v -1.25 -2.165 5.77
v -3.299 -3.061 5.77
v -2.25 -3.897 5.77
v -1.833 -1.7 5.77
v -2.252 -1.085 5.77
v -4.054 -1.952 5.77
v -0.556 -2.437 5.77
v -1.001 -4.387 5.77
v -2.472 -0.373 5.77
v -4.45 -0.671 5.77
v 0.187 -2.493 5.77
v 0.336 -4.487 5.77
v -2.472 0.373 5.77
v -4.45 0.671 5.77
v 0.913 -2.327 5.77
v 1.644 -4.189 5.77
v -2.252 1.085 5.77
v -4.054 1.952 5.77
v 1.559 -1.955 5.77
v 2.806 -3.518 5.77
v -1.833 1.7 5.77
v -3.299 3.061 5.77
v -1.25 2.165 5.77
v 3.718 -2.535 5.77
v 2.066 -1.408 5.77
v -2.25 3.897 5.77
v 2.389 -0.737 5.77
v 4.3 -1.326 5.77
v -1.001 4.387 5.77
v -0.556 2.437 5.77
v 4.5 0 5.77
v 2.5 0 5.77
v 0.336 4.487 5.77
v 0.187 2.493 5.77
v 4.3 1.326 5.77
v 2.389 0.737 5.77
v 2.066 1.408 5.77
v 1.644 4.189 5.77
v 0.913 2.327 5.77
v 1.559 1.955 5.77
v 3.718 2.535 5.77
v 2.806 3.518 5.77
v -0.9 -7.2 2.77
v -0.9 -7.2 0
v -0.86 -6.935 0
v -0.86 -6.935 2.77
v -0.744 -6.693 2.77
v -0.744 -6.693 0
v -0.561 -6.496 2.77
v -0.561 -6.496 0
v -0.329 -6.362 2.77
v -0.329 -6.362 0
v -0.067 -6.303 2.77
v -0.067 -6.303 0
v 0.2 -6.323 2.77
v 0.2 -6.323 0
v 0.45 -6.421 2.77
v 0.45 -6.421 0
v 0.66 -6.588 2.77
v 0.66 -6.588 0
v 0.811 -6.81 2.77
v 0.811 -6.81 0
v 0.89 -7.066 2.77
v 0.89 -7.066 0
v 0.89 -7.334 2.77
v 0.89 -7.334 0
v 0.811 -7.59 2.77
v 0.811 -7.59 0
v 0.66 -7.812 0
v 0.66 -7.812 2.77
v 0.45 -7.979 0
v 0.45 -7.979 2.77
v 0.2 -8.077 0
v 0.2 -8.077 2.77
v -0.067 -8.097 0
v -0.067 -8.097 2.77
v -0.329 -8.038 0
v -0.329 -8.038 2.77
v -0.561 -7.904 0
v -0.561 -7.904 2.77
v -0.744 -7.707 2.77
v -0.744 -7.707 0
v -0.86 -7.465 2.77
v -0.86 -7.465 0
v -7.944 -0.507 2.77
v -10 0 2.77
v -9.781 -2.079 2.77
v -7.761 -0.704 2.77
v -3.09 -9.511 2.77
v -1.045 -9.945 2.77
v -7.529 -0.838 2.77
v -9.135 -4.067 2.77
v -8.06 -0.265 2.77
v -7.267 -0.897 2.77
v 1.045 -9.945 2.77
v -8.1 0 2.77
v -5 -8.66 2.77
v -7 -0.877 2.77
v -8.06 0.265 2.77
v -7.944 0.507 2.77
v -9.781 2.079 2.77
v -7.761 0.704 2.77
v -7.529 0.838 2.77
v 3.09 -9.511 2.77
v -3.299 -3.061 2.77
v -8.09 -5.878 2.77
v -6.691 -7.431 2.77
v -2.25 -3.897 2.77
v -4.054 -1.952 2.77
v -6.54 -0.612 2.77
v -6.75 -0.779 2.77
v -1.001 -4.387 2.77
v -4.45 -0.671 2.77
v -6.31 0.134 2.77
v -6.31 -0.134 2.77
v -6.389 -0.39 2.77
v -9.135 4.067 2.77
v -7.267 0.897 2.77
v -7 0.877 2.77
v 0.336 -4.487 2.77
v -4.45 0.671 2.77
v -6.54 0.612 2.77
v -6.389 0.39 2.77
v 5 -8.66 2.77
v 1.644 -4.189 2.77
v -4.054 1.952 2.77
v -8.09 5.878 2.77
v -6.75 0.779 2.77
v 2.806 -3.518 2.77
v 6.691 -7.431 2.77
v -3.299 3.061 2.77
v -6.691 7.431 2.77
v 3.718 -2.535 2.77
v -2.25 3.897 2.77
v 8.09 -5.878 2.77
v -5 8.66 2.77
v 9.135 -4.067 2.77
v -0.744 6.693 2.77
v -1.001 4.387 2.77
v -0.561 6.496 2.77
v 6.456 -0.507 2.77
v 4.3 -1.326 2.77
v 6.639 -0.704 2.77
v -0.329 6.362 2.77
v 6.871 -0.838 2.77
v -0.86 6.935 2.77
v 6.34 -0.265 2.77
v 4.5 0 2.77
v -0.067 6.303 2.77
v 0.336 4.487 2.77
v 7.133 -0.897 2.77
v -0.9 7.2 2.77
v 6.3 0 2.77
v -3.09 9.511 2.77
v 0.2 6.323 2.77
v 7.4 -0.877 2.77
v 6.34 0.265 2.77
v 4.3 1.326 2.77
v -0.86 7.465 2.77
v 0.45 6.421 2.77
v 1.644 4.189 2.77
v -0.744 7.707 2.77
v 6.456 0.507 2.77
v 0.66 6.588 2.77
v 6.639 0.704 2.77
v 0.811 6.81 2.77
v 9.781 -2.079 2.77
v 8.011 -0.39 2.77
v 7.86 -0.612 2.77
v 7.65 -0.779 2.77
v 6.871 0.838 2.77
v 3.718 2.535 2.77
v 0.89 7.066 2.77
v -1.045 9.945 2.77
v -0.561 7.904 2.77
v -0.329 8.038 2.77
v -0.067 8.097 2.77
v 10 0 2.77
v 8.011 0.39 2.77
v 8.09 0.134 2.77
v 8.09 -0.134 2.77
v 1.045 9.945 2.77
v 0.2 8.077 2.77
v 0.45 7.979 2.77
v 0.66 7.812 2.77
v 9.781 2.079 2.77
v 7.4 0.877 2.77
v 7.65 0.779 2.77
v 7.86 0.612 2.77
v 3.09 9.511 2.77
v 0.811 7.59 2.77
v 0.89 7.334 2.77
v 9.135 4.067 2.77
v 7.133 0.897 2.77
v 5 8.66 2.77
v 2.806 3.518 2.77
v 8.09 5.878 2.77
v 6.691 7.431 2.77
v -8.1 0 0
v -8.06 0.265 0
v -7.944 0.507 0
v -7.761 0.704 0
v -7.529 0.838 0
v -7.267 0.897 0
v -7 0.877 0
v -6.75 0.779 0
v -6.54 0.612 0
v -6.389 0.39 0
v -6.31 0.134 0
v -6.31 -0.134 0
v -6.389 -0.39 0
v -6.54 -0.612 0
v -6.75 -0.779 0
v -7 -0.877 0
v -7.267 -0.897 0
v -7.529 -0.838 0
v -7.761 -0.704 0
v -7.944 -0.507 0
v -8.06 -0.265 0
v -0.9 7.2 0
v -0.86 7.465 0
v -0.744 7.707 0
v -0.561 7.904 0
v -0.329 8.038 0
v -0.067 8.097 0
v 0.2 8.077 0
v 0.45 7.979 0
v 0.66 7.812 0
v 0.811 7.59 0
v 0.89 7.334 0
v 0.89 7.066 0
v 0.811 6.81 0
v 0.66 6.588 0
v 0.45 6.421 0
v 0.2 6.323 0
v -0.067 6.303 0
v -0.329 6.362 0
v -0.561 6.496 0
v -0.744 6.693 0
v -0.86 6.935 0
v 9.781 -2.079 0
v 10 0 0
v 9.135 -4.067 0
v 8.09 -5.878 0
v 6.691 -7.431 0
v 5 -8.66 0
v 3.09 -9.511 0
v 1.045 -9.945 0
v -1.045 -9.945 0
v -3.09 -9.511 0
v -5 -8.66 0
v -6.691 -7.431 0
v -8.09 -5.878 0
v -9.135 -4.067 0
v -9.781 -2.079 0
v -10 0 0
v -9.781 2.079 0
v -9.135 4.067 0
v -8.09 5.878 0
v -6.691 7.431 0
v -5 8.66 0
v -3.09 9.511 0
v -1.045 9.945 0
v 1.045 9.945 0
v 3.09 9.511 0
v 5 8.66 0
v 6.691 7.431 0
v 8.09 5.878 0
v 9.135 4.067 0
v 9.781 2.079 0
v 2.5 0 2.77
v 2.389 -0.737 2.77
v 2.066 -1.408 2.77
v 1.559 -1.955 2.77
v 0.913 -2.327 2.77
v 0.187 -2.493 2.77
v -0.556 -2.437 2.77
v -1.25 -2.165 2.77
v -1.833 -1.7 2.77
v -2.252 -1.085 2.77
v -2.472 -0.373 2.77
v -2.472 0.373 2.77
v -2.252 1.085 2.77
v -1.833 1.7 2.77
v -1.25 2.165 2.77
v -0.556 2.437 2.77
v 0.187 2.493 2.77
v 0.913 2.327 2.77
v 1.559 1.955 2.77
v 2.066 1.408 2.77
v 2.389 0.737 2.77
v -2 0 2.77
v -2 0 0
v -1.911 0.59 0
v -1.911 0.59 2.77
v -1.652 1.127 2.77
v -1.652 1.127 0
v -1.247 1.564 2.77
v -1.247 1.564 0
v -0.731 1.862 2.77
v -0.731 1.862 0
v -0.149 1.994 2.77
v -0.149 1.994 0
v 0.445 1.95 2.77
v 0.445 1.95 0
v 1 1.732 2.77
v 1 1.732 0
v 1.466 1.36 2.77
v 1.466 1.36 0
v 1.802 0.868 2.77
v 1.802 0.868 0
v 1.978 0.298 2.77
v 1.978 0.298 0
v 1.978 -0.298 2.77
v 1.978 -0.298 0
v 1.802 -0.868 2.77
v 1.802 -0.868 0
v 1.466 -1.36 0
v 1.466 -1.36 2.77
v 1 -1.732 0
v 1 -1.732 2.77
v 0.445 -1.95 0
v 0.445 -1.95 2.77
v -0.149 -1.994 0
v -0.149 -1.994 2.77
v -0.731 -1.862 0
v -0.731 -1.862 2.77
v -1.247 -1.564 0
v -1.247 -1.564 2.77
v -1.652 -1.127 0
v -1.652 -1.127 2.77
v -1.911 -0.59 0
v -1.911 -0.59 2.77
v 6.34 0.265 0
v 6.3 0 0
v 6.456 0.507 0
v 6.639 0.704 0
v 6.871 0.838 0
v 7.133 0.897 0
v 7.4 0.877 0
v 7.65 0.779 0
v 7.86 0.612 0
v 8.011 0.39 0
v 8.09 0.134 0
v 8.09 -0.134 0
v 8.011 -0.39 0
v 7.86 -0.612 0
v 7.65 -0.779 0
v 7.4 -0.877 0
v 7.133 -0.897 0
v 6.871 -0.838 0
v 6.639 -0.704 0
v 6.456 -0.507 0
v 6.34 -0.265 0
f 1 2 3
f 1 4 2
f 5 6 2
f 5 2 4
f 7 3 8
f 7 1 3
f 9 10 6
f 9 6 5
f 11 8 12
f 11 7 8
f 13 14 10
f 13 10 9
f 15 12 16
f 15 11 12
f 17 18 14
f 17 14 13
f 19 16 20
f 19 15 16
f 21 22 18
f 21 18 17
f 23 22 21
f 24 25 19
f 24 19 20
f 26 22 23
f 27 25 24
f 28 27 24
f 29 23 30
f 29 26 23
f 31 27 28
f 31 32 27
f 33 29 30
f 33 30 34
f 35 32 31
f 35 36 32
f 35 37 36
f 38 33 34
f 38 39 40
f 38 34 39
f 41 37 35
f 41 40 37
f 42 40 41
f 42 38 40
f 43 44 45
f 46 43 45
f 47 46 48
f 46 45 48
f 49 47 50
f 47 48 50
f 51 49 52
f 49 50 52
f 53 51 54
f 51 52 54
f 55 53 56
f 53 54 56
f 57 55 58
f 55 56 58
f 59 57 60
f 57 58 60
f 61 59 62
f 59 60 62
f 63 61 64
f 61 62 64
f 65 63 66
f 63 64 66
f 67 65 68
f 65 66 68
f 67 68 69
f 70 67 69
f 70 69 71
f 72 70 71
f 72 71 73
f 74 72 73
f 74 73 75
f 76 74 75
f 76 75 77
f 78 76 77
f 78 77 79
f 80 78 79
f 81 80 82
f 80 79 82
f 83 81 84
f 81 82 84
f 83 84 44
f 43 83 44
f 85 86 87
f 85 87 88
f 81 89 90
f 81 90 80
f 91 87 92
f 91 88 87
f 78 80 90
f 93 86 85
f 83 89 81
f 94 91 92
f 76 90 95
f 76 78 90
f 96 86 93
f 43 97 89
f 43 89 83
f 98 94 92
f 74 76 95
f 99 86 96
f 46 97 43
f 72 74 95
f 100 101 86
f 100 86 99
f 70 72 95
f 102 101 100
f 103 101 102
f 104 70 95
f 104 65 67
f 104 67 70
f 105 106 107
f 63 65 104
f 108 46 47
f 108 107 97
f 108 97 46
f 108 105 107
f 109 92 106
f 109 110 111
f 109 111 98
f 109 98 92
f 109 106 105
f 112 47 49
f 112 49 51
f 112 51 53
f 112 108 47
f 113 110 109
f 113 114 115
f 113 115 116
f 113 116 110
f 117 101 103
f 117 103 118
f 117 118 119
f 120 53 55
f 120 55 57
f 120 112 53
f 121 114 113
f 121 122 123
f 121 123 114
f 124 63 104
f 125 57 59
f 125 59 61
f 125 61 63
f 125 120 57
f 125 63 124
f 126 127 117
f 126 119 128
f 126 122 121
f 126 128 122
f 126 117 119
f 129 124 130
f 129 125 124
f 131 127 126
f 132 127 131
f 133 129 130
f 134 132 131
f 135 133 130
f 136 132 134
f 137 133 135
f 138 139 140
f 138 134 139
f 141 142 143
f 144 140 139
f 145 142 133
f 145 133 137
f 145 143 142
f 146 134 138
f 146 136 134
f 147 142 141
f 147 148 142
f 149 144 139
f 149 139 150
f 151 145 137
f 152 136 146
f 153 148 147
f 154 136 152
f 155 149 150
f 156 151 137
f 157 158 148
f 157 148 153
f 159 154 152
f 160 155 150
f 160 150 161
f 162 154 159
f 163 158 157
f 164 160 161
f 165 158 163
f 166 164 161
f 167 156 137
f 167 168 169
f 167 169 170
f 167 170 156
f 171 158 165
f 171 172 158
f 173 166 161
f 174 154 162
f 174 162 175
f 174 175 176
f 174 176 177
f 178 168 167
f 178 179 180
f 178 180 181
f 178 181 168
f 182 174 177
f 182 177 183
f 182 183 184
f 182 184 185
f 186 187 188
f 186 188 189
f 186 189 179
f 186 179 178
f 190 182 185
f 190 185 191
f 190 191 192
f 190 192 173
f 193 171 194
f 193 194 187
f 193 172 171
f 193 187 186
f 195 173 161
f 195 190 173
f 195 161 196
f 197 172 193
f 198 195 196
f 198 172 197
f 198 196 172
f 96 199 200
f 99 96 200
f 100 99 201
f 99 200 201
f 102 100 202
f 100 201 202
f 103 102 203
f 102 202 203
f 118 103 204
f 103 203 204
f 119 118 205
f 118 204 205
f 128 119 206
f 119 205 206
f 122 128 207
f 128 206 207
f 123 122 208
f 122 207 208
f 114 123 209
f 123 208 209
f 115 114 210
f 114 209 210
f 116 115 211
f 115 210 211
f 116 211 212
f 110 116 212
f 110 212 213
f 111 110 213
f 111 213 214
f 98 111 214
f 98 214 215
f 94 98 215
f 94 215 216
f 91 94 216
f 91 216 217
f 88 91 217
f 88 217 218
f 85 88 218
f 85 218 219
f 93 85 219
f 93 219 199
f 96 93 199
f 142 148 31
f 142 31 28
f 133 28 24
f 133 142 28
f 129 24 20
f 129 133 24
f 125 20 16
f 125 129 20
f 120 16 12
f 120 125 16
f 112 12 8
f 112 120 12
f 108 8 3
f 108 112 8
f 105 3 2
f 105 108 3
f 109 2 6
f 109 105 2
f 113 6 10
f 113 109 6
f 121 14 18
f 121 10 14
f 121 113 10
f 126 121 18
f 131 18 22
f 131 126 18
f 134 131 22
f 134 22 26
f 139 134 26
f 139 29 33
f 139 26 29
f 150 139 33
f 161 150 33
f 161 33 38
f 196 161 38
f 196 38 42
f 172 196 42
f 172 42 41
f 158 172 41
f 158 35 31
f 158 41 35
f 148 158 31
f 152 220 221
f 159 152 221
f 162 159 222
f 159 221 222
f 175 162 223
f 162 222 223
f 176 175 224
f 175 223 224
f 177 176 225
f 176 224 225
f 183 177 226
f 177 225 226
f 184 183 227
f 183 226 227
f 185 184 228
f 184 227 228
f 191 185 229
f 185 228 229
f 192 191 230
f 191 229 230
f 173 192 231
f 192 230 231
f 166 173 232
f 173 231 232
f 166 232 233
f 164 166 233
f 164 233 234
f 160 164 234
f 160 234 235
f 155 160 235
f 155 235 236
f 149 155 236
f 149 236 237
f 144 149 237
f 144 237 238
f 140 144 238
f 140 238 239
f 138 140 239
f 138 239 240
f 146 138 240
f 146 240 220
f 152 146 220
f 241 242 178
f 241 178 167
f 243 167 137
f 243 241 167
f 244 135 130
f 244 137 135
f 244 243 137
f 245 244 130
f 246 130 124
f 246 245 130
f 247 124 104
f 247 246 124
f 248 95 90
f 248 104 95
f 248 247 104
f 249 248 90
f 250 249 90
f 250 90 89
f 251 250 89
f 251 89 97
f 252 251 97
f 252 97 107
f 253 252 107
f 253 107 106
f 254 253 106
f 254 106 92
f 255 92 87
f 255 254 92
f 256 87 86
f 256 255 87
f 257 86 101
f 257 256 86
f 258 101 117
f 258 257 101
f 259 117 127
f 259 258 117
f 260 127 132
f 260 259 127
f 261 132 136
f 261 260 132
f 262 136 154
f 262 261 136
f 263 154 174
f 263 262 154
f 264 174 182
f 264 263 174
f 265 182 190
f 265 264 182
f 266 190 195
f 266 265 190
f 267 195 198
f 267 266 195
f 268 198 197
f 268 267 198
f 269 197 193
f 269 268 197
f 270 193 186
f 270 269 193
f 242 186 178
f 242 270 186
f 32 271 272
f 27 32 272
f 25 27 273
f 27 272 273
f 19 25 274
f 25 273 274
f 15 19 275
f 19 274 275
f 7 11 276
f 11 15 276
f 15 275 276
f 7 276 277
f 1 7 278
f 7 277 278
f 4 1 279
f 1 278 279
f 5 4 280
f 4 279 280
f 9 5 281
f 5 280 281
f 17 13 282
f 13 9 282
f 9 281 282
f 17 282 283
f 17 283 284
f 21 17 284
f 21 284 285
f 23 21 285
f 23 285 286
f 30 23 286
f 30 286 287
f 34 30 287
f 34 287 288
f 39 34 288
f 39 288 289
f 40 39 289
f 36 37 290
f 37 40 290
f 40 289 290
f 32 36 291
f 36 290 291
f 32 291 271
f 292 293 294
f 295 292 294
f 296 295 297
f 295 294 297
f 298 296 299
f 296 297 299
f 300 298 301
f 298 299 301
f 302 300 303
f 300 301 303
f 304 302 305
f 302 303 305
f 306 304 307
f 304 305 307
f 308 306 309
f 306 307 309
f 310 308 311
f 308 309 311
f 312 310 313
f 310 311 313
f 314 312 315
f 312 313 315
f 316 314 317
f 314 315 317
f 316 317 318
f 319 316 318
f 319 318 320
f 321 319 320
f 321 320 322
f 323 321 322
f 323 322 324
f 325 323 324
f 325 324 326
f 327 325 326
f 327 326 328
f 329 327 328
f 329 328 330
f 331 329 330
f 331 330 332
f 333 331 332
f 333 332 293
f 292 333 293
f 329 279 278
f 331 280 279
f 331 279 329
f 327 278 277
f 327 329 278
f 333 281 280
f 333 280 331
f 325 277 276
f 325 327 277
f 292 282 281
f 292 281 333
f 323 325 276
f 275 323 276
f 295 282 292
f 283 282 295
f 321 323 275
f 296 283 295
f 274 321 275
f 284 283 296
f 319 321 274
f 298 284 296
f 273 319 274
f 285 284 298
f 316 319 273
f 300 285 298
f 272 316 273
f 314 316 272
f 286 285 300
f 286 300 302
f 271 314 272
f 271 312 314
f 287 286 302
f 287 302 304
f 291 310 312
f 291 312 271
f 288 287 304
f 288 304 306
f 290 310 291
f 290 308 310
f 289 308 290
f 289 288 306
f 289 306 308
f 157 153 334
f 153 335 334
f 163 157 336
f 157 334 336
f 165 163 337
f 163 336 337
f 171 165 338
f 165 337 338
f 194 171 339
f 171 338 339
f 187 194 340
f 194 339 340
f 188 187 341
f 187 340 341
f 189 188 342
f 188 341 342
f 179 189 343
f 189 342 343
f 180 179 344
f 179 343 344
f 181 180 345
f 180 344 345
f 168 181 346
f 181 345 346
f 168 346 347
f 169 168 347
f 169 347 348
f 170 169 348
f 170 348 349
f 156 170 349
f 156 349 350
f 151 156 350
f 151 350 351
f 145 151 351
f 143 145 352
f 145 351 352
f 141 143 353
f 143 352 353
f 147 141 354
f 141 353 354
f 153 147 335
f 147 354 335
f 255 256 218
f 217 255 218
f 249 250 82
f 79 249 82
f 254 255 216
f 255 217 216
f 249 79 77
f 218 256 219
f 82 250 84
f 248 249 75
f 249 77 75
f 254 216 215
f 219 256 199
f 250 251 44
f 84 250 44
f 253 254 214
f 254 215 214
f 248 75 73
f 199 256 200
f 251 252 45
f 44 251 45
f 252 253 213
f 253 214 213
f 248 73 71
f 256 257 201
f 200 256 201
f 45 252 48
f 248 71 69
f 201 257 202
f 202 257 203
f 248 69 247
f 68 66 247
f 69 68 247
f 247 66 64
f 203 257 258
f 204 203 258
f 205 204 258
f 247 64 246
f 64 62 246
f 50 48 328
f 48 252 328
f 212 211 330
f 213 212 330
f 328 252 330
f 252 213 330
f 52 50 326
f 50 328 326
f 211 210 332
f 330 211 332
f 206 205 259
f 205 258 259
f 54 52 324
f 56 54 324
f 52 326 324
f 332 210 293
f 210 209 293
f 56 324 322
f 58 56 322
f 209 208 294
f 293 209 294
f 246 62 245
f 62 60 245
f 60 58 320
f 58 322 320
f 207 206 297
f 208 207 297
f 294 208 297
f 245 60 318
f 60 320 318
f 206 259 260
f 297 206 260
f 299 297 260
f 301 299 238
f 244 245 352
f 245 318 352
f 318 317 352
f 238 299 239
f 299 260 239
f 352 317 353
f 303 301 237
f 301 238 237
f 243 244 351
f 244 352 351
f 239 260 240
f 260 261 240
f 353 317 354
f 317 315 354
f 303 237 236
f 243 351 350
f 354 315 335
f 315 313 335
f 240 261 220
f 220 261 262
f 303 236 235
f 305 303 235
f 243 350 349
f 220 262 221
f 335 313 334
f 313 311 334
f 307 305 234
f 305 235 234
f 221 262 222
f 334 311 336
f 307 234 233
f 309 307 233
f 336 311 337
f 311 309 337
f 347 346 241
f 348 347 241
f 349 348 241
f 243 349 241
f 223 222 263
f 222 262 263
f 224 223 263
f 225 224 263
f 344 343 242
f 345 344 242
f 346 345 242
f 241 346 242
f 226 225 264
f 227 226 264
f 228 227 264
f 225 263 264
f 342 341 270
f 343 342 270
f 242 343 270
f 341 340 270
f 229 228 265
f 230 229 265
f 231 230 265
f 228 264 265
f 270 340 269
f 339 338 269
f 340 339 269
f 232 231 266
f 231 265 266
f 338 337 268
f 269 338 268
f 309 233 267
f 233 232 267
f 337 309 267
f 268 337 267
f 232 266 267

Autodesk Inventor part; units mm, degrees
ref_plane "YZ Plane" through (0, 0, 0) normal (1, 0, 0) x (0, 1, 0)
ref_plane "XZ Plane" through (0, 0, 0) normal (0, 1, 0) x (-1, 0, 0)
ref_plane "XY Plane" through (0, 0, 0) normal (0, 0, 1) x (1, 0, 0)
sketch "Sketch1" plane through (0, 0, 0) normal (0, 0, 1) x (1, 0, 0)
  circle A0 centre (0, 0) radius 10
  dimension "d0" = 20
extrude "Extrusion1" add sketch "Sketch1" along normal blind 2.77
sketch "Sketch2" plane through (0, 0, 2.77) normal (0, 0, 1) x (1, 0, 0)
  circle A0 centre (0, 0) radius 2.5
  circle A1 centre (0, 0) radius 4.5
  dimension "d3" = 5
  dimension "d4" = 9
extrude "Extrusion2" add sketch "Sketch2" along normal blind 3
sketch "Sketch3" plane through (0, 0, 0) normal (0, 0, -1) x (-1, 0, 0)
  circle A0 centre (7.2, 0) radius 0.9
  circle A1 centre (0, 7.2) radius 0.9
  circle A2 centre (-7.2, 0) radius 0.9
  circle A3 centre (0, -7.2) radius 0.9
  point P0 (0, 0)
  dimension "d11" = 360
extrude "Extrusion3" cut sketch "Sketch3" against normal blind 3
sketch "Sketch4" plane through (0, 0, 0) normal (0, 0, -1) x (-1, 0, 0)
  circle A0 centre (0, 0) radius 2
  dimension "d18" = 4
extrude "Extrusion4" cut sketch "Sketch4" against normal blind 5
sketch "Sketch5" plane through (0, 0, 0) normal (0, 0, -1) x (-1, 0, 0)
  point P0 (0, 0)
equation "\"d16\" = d15"
equation "\"d15\" = 5"
properties part number "SERVOHORN"
